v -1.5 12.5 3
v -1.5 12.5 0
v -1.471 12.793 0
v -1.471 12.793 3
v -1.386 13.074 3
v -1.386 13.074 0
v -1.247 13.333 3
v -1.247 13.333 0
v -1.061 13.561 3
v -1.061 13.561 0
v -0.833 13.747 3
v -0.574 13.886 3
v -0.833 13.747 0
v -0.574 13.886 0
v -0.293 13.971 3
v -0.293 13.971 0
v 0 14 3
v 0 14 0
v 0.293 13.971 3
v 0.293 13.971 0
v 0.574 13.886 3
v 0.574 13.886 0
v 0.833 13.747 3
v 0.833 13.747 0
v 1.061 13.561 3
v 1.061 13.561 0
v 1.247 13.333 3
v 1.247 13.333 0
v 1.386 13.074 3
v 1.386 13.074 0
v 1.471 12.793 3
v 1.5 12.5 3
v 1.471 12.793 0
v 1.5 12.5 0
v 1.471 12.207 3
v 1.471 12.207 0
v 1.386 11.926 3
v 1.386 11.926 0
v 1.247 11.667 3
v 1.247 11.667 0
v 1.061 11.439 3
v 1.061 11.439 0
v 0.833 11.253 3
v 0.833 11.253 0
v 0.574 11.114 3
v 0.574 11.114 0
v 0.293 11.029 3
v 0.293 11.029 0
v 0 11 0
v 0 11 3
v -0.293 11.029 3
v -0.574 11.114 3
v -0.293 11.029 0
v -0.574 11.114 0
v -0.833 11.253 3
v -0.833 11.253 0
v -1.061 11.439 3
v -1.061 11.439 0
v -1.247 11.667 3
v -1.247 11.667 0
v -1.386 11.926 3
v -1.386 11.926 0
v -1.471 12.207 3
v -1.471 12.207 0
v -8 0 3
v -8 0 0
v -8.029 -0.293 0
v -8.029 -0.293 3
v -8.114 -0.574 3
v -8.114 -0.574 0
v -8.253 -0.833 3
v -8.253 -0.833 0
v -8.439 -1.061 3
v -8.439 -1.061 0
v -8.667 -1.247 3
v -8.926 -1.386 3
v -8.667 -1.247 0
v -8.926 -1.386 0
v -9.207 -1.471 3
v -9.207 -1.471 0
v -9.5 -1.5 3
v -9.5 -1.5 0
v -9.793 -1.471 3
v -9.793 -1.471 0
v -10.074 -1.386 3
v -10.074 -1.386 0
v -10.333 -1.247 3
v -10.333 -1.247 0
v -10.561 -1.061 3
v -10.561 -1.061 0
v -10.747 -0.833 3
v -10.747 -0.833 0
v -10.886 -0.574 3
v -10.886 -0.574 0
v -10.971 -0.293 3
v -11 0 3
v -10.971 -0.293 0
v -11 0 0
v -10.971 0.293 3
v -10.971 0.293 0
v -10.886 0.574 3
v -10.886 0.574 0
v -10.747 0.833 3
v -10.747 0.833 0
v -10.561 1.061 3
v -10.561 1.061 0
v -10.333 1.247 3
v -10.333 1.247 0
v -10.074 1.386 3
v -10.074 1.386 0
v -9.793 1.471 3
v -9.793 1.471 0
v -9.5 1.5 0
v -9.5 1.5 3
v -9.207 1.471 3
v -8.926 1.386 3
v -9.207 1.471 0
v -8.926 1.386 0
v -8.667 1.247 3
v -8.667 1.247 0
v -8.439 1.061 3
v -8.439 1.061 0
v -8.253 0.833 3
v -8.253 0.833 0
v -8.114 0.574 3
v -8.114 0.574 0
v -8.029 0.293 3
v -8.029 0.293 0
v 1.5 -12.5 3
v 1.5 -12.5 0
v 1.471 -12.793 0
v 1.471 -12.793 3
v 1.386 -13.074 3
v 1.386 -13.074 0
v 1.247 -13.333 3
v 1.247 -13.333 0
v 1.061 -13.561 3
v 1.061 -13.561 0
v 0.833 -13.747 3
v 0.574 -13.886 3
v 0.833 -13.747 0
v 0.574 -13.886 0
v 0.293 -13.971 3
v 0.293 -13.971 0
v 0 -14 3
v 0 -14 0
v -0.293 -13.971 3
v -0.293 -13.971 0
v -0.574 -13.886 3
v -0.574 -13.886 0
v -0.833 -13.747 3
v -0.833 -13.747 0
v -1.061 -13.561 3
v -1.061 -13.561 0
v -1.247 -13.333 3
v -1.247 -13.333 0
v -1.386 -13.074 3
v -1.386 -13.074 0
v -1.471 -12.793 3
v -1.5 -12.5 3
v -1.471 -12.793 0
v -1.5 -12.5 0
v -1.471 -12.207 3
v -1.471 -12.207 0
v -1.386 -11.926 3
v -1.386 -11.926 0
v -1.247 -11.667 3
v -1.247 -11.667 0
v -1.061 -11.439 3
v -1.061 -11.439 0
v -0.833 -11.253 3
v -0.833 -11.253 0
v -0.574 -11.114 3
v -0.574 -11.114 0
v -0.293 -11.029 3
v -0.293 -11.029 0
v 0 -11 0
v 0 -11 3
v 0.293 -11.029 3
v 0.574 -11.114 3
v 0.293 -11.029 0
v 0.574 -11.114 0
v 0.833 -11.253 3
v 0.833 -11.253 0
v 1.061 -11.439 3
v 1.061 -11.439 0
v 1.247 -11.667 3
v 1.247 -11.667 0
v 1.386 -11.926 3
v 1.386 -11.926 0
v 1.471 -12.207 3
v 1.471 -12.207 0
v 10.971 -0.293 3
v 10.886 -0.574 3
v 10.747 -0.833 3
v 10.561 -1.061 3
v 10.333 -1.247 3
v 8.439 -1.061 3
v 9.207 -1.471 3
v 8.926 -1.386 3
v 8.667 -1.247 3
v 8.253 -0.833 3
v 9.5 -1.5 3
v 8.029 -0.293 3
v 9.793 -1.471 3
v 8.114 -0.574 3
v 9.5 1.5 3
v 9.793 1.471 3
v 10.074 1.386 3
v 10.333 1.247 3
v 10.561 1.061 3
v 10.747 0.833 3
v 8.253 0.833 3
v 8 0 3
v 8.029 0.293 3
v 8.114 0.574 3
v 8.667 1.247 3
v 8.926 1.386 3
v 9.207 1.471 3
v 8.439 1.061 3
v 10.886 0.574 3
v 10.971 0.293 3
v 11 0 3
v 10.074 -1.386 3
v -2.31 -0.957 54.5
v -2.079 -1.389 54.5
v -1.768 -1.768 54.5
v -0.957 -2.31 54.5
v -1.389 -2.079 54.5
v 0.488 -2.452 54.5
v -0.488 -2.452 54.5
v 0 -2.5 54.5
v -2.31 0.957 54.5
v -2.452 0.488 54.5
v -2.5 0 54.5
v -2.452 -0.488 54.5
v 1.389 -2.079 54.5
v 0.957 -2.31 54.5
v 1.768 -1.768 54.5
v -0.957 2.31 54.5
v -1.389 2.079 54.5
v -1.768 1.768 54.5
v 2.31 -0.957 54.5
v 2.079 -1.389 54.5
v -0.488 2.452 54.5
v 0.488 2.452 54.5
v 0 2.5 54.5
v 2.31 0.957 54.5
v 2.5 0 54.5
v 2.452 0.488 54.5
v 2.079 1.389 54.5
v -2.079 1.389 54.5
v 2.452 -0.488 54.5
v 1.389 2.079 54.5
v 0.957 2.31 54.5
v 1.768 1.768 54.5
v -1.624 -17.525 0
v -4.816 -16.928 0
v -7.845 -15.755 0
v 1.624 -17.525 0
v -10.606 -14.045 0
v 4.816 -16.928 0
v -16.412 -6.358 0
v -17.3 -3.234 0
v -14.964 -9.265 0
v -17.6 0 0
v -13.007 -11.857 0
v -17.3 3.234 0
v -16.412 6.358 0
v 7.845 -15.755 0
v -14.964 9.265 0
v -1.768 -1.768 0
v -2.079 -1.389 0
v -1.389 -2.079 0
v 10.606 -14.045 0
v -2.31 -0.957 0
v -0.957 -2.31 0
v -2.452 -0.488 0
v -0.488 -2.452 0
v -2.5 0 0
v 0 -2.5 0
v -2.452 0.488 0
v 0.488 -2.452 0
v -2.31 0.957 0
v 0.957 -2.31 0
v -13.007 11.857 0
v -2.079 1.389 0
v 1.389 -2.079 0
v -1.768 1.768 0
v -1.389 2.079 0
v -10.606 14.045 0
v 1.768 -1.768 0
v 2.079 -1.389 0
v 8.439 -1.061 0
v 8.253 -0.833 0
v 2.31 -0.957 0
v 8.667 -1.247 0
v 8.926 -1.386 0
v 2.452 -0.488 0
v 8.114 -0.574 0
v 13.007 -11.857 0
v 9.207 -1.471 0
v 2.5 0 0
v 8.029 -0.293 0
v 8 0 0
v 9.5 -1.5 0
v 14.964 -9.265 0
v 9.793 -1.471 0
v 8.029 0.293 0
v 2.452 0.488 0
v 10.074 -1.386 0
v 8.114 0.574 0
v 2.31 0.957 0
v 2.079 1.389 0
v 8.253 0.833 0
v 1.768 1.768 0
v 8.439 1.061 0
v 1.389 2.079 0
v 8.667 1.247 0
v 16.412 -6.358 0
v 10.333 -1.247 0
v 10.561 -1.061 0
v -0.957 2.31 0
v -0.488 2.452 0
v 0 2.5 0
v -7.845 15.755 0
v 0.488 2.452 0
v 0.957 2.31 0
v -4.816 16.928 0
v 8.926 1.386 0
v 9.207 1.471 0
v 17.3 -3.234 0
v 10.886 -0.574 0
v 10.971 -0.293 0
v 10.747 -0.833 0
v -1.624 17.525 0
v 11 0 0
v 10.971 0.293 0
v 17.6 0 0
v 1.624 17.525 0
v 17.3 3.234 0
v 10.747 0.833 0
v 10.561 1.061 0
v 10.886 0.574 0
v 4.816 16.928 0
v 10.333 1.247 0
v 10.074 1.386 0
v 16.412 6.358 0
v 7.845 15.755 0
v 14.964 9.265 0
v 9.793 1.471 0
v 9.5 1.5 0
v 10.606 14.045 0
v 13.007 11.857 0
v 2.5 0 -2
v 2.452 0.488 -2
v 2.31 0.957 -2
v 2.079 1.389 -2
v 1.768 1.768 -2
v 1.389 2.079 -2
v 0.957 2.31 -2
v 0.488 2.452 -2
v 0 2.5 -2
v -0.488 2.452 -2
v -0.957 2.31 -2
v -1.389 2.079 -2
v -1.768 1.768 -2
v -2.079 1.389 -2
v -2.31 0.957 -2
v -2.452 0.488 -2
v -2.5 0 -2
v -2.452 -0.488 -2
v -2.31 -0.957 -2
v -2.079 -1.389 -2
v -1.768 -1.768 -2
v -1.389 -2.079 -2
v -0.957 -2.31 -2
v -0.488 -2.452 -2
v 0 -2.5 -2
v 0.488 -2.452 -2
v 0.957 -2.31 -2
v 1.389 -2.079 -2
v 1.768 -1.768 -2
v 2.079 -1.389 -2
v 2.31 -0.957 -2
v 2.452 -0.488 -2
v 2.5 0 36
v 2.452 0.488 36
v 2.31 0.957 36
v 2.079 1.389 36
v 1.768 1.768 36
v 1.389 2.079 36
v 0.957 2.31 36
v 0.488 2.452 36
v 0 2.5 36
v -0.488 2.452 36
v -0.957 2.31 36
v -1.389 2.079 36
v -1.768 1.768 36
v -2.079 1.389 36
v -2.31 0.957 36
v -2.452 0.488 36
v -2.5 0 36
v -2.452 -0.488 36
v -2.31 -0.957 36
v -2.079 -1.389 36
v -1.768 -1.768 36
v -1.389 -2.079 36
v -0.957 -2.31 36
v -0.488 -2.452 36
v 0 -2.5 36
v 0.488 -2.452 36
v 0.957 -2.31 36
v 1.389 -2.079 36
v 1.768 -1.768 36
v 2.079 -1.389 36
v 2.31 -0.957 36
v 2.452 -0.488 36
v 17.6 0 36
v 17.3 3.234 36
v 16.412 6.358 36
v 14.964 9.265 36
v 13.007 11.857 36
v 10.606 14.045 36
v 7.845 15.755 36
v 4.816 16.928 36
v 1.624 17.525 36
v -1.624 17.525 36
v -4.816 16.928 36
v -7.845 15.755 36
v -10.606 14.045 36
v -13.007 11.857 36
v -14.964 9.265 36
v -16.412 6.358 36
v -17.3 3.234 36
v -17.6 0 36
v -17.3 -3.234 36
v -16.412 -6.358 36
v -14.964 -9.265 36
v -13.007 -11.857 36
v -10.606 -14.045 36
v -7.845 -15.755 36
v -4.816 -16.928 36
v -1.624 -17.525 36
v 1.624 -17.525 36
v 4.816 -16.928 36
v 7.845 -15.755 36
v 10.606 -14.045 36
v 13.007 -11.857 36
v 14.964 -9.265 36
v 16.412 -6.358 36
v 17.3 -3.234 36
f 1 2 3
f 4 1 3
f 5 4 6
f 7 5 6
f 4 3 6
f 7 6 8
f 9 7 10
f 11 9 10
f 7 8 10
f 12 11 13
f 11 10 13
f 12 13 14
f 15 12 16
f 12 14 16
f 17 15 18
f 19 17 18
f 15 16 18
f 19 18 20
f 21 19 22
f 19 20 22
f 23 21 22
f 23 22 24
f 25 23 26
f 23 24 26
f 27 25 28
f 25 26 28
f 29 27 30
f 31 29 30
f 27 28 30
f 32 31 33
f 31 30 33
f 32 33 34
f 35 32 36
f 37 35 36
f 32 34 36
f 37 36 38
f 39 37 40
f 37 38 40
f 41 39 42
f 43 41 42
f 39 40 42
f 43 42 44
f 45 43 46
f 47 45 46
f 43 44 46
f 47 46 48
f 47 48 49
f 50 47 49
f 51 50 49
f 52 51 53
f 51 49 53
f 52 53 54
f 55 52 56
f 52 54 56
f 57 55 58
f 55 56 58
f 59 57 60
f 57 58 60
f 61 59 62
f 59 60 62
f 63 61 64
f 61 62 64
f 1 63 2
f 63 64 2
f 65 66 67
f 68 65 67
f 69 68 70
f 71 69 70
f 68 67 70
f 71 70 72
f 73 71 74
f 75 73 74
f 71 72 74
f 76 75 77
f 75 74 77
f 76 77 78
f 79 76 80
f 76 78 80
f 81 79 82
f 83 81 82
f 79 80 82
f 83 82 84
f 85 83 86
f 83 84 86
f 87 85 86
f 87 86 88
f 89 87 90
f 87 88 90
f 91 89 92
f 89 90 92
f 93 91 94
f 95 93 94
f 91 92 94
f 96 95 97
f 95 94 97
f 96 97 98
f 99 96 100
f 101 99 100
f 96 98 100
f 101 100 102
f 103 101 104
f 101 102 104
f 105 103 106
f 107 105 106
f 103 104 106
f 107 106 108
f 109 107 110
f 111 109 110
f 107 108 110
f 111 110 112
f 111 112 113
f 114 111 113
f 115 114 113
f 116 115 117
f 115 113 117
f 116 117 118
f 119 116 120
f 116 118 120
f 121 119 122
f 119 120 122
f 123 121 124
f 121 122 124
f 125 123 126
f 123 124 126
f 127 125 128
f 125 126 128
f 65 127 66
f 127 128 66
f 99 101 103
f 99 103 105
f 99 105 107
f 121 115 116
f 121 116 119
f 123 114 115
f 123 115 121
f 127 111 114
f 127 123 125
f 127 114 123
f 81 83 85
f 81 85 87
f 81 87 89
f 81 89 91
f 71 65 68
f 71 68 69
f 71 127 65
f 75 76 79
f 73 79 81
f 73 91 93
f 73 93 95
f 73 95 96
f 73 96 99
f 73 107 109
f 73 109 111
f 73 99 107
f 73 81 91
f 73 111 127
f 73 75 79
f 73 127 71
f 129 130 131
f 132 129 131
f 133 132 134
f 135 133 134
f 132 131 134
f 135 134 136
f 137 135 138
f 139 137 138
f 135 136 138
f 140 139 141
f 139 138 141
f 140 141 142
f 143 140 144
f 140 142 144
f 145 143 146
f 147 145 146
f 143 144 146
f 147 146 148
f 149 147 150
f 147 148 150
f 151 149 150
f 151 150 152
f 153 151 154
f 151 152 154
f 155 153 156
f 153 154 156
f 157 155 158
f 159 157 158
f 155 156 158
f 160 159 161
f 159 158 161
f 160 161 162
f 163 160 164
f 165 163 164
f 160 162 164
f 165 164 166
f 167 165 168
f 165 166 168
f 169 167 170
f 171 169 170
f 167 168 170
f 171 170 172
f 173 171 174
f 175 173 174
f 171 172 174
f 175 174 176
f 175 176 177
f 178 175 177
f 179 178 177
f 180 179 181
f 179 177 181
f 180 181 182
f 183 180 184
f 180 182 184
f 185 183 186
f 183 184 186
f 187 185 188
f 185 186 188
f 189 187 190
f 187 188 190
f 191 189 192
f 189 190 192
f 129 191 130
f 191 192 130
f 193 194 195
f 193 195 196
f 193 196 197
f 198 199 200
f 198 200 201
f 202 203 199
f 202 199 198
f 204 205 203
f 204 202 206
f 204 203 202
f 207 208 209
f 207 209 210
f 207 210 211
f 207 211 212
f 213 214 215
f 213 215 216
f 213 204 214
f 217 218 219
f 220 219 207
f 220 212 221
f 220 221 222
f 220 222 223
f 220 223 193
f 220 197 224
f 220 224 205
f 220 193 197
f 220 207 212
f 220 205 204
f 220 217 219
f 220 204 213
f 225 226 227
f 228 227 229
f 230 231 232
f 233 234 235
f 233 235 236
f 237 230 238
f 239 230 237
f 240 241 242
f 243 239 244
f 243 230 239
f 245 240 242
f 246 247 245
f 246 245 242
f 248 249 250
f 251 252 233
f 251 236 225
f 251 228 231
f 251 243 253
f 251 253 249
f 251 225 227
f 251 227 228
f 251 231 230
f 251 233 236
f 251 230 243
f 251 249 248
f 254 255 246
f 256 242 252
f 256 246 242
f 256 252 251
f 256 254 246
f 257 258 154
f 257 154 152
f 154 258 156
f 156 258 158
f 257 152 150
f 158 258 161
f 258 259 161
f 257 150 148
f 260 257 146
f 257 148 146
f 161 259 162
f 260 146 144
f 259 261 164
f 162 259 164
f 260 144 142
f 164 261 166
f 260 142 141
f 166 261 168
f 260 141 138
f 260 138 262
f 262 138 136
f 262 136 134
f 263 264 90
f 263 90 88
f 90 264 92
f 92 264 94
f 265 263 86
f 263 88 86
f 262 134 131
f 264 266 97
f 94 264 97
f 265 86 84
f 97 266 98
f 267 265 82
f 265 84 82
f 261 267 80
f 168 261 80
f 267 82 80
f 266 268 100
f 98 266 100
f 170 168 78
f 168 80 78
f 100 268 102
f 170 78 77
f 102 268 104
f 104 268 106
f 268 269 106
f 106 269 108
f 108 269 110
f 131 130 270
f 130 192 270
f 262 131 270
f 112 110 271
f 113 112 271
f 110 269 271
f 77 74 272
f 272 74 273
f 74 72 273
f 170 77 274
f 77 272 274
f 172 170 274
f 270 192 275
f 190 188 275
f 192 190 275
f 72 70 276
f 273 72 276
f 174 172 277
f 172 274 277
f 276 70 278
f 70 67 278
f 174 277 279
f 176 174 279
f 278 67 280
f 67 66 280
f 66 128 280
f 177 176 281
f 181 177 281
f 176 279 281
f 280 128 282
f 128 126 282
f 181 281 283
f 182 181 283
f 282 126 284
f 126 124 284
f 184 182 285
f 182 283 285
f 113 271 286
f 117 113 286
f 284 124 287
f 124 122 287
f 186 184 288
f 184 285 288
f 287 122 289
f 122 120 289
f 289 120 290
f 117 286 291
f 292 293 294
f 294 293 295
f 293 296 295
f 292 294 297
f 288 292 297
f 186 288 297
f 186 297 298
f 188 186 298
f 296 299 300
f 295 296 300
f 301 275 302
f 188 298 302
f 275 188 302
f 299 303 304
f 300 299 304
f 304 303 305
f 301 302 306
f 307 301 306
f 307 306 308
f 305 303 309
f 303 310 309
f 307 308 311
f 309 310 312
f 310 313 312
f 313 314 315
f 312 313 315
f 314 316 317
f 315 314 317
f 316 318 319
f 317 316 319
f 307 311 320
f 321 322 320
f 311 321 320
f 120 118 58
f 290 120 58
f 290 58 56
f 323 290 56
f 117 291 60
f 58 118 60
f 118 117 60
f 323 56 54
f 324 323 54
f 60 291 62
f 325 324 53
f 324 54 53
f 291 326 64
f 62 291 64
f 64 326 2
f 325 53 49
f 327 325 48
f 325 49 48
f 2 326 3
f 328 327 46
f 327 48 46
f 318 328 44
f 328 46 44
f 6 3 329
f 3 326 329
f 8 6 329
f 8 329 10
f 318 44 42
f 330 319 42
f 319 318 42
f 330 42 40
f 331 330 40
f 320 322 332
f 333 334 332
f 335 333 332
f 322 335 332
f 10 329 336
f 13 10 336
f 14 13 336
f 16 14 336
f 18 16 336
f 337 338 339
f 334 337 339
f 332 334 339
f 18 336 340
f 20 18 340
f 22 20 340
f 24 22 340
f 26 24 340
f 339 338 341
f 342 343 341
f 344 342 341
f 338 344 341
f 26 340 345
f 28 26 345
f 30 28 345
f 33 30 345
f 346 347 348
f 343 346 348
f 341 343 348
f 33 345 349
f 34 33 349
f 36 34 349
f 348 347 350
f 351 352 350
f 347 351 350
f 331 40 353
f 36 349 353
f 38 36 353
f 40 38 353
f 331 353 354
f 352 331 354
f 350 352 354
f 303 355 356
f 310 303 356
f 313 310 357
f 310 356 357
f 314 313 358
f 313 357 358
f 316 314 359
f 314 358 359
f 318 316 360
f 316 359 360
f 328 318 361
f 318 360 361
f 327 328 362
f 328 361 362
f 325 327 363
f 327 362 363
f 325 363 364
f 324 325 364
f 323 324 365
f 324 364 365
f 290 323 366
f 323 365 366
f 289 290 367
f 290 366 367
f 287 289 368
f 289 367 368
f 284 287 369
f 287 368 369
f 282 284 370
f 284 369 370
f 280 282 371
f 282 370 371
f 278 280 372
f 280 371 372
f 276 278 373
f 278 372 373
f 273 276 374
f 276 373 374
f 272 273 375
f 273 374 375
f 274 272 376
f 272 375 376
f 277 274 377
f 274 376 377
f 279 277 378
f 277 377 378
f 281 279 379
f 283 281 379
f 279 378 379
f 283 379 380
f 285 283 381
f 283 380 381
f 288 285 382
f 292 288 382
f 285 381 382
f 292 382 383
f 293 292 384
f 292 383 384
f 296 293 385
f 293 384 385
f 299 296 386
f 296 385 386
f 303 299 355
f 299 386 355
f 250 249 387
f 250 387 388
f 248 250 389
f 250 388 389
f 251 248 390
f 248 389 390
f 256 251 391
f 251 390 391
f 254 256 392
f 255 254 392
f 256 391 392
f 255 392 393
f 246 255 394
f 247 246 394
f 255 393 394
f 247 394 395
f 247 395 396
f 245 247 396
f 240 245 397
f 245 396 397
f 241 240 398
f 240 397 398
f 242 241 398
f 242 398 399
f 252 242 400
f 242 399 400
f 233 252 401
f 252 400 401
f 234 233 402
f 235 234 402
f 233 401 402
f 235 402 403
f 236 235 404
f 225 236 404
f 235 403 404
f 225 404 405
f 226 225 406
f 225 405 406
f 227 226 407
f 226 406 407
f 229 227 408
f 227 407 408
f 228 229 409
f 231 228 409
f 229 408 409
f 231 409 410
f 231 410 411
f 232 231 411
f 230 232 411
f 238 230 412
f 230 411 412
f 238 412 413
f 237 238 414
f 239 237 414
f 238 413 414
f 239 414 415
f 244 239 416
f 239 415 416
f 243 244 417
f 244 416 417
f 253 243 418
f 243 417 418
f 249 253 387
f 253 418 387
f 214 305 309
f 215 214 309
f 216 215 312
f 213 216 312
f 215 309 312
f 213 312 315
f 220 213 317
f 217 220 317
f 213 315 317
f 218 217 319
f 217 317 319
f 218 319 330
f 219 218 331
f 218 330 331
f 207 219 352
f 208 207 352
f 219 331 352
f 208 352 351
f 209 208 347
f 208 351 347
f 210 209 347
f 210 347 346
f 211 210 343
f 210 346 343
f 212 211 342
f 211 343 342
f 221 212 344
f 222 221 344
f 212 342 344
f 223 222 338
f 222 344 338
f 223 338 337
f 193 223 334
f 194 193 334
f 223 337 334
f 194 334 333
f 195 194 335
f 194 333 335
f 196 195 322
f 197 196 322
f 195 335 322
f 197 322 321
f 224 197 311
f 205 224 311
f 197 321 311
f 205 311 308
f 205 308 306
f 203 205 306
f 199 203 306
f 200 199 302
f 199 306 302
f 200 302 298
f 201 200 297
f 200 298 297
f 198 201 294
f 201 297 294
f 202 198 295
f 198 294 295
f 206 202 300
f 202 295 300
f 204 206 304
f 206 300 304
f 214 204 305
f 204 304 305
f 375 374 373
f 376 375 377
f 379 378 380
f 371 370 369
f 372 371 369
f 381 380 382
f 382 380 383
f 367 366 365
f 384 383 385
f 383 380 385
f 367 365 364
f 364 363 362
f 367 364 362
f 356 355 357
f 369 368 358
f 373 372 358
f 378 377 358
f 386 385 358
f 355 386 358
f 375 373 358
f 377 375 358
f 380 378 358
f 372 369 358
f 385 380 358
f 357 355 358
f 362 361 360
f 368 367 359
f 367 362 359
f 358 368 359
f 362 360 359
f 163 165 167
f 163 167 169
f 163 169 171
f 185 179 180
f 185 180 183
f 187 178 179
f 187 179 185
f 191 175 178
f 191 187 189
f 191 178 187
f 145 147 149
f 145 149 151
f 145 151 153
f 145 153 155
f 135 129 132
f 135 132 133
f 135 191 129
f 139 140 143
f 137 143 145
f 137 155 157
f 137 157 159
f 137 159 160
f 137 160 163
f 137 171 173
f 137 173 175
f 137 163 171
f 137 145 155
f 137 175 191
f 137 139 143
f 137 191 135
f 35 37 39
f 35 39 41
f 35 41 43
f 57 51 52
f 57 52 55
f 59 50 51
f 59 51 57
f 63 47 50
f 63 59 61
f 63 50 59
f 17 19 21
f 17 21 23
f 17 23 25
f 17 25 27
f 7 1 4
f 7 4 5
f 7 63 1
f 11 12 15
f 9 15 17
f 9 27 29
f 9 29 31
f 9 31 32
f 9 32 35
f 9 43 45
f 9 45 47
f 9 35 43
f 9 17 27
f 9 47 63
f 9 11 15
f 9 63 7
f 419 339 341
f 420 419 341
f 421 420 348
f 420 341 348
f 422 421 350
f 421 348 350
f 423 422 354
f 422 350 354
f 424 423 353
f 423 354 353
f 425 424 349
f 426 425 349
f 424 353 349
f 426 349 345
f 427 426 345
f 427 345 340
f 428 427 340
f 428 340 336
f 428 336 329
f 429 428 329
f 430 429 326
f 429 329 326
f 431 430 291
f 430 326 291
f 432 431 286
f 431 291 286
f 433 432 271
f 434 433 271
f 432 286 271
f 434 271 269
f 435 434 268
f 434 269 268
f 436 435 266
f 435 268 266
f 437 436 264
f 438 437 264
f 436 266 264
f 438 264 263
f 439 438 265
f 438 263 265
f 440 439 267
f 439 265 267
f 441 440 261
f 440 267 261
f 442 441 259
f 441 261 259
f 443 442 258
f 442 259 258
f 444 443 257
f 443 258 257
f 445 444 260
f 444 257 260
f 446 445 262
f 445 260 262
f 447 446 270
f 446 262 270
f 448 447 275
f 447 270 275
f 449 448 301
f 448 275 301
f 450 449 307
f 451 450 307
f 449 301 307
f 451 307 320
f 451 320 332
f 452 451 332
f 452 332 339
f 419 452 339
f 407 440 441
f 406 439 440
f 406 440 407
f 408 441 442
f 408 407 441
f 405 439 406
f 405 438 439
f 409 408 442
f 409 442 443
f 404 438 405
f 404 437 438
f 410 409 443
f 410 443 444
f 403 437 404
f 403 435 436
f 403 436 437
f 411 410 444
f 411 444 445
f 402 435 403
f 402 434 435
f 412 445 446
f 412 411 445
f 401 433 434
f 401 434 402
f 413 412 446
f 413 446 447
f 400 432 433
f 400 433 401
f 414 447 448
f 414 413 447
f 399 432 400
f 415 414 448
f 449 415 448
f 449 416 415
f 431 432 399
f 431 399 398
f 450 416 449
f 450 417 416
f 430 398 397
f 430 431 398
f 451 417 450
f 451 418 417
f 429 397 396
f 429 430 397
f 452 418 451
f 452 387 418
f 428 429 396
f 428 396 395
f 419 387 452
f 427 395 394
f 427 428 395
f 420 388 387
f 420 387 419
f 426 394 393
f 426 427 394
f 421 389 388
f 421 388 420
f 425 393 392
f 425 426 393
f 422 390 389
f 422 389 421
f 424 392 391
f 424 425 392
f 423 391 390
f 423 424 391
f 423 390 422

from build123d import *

# Parameters (mm, degrees)
SKETCH_1_R          = 17.6
SKETCH_1_R_2        = 2.5
EXTRUDE_1_DEPTH     = 36
EXTRUDE_START       = -2
SKETCH_1_4_R        = 2.5
EXTRUDE_2_DEPTH     = 2
EXTRUDE_START_2     = 36
SKETCH_1_5_R        = 2.5
EXTRUDE_3_DEPTH     = 18.5
SKETCH_2_R          = 1.5
CUT_EXTRUDE_1_DEPTH = 3


with BuildPart() as part:
    # Эскиз1 → Бобышка-Вытянуть1 (new body)
    # profile 1 of 2: a face of its own
    with BuildSketch(Plane.XY):
        Circle(SKETCH_1_R)
        Circle(SKETCH_1_R_2, mode=Mode.SUBTRACT)
    # profile 2 of 2: a face of its own
    with BuildSketch(Plane.XY):
        Circle(SKETCH_1_R_2)
    extrude(amount=EXTRUDE_1_DEPTH)

    # Эскиз1<4> → Бобышка-Вытянуть2 (add)
    with BuildSketch(Plane.XY.offset(EXTRUDE_START)):
        Circle(SKETCH_1_4_R)
    extrude(amount=EXTRUDE_2_DEPTH)

    # Эскиз1<5> → Бобышка-Вытянуть3 (add)
    with BuildSketch(Plane.XY.offset(EXTRUDE_START_2)):
        Circle(SKETCH_1_5_R)
    extrude(amount=EXTRUDE_3_DEPTH)

    # Эскиз2 → Вырез-Вытянуть1 (cut)
    with BuildSketch(Plane(origin=(0, 0, 0), x_dir=(-1, 0, 0), z_dir=(0, 0, -1))):
        with Locations((0, 12.5)):
            Circle(SKETCH_2_R)
        with Locations((-9.5, 0)):
            Circle(SKETCH_2_R)
        with Locations(Location((0, -12.5, 0), (0, 0, 180))):
            Circle(SKETCH_2_R)
        with Locations(Location((9.5, 0, 0), (0, 0, 180))):
            Circle(SKETCH_2_R)
    extrude(amount=-CUT_EXTRUDE_1_DEPTH, mode=Mode.SUBTRACT)


solid = part.part
